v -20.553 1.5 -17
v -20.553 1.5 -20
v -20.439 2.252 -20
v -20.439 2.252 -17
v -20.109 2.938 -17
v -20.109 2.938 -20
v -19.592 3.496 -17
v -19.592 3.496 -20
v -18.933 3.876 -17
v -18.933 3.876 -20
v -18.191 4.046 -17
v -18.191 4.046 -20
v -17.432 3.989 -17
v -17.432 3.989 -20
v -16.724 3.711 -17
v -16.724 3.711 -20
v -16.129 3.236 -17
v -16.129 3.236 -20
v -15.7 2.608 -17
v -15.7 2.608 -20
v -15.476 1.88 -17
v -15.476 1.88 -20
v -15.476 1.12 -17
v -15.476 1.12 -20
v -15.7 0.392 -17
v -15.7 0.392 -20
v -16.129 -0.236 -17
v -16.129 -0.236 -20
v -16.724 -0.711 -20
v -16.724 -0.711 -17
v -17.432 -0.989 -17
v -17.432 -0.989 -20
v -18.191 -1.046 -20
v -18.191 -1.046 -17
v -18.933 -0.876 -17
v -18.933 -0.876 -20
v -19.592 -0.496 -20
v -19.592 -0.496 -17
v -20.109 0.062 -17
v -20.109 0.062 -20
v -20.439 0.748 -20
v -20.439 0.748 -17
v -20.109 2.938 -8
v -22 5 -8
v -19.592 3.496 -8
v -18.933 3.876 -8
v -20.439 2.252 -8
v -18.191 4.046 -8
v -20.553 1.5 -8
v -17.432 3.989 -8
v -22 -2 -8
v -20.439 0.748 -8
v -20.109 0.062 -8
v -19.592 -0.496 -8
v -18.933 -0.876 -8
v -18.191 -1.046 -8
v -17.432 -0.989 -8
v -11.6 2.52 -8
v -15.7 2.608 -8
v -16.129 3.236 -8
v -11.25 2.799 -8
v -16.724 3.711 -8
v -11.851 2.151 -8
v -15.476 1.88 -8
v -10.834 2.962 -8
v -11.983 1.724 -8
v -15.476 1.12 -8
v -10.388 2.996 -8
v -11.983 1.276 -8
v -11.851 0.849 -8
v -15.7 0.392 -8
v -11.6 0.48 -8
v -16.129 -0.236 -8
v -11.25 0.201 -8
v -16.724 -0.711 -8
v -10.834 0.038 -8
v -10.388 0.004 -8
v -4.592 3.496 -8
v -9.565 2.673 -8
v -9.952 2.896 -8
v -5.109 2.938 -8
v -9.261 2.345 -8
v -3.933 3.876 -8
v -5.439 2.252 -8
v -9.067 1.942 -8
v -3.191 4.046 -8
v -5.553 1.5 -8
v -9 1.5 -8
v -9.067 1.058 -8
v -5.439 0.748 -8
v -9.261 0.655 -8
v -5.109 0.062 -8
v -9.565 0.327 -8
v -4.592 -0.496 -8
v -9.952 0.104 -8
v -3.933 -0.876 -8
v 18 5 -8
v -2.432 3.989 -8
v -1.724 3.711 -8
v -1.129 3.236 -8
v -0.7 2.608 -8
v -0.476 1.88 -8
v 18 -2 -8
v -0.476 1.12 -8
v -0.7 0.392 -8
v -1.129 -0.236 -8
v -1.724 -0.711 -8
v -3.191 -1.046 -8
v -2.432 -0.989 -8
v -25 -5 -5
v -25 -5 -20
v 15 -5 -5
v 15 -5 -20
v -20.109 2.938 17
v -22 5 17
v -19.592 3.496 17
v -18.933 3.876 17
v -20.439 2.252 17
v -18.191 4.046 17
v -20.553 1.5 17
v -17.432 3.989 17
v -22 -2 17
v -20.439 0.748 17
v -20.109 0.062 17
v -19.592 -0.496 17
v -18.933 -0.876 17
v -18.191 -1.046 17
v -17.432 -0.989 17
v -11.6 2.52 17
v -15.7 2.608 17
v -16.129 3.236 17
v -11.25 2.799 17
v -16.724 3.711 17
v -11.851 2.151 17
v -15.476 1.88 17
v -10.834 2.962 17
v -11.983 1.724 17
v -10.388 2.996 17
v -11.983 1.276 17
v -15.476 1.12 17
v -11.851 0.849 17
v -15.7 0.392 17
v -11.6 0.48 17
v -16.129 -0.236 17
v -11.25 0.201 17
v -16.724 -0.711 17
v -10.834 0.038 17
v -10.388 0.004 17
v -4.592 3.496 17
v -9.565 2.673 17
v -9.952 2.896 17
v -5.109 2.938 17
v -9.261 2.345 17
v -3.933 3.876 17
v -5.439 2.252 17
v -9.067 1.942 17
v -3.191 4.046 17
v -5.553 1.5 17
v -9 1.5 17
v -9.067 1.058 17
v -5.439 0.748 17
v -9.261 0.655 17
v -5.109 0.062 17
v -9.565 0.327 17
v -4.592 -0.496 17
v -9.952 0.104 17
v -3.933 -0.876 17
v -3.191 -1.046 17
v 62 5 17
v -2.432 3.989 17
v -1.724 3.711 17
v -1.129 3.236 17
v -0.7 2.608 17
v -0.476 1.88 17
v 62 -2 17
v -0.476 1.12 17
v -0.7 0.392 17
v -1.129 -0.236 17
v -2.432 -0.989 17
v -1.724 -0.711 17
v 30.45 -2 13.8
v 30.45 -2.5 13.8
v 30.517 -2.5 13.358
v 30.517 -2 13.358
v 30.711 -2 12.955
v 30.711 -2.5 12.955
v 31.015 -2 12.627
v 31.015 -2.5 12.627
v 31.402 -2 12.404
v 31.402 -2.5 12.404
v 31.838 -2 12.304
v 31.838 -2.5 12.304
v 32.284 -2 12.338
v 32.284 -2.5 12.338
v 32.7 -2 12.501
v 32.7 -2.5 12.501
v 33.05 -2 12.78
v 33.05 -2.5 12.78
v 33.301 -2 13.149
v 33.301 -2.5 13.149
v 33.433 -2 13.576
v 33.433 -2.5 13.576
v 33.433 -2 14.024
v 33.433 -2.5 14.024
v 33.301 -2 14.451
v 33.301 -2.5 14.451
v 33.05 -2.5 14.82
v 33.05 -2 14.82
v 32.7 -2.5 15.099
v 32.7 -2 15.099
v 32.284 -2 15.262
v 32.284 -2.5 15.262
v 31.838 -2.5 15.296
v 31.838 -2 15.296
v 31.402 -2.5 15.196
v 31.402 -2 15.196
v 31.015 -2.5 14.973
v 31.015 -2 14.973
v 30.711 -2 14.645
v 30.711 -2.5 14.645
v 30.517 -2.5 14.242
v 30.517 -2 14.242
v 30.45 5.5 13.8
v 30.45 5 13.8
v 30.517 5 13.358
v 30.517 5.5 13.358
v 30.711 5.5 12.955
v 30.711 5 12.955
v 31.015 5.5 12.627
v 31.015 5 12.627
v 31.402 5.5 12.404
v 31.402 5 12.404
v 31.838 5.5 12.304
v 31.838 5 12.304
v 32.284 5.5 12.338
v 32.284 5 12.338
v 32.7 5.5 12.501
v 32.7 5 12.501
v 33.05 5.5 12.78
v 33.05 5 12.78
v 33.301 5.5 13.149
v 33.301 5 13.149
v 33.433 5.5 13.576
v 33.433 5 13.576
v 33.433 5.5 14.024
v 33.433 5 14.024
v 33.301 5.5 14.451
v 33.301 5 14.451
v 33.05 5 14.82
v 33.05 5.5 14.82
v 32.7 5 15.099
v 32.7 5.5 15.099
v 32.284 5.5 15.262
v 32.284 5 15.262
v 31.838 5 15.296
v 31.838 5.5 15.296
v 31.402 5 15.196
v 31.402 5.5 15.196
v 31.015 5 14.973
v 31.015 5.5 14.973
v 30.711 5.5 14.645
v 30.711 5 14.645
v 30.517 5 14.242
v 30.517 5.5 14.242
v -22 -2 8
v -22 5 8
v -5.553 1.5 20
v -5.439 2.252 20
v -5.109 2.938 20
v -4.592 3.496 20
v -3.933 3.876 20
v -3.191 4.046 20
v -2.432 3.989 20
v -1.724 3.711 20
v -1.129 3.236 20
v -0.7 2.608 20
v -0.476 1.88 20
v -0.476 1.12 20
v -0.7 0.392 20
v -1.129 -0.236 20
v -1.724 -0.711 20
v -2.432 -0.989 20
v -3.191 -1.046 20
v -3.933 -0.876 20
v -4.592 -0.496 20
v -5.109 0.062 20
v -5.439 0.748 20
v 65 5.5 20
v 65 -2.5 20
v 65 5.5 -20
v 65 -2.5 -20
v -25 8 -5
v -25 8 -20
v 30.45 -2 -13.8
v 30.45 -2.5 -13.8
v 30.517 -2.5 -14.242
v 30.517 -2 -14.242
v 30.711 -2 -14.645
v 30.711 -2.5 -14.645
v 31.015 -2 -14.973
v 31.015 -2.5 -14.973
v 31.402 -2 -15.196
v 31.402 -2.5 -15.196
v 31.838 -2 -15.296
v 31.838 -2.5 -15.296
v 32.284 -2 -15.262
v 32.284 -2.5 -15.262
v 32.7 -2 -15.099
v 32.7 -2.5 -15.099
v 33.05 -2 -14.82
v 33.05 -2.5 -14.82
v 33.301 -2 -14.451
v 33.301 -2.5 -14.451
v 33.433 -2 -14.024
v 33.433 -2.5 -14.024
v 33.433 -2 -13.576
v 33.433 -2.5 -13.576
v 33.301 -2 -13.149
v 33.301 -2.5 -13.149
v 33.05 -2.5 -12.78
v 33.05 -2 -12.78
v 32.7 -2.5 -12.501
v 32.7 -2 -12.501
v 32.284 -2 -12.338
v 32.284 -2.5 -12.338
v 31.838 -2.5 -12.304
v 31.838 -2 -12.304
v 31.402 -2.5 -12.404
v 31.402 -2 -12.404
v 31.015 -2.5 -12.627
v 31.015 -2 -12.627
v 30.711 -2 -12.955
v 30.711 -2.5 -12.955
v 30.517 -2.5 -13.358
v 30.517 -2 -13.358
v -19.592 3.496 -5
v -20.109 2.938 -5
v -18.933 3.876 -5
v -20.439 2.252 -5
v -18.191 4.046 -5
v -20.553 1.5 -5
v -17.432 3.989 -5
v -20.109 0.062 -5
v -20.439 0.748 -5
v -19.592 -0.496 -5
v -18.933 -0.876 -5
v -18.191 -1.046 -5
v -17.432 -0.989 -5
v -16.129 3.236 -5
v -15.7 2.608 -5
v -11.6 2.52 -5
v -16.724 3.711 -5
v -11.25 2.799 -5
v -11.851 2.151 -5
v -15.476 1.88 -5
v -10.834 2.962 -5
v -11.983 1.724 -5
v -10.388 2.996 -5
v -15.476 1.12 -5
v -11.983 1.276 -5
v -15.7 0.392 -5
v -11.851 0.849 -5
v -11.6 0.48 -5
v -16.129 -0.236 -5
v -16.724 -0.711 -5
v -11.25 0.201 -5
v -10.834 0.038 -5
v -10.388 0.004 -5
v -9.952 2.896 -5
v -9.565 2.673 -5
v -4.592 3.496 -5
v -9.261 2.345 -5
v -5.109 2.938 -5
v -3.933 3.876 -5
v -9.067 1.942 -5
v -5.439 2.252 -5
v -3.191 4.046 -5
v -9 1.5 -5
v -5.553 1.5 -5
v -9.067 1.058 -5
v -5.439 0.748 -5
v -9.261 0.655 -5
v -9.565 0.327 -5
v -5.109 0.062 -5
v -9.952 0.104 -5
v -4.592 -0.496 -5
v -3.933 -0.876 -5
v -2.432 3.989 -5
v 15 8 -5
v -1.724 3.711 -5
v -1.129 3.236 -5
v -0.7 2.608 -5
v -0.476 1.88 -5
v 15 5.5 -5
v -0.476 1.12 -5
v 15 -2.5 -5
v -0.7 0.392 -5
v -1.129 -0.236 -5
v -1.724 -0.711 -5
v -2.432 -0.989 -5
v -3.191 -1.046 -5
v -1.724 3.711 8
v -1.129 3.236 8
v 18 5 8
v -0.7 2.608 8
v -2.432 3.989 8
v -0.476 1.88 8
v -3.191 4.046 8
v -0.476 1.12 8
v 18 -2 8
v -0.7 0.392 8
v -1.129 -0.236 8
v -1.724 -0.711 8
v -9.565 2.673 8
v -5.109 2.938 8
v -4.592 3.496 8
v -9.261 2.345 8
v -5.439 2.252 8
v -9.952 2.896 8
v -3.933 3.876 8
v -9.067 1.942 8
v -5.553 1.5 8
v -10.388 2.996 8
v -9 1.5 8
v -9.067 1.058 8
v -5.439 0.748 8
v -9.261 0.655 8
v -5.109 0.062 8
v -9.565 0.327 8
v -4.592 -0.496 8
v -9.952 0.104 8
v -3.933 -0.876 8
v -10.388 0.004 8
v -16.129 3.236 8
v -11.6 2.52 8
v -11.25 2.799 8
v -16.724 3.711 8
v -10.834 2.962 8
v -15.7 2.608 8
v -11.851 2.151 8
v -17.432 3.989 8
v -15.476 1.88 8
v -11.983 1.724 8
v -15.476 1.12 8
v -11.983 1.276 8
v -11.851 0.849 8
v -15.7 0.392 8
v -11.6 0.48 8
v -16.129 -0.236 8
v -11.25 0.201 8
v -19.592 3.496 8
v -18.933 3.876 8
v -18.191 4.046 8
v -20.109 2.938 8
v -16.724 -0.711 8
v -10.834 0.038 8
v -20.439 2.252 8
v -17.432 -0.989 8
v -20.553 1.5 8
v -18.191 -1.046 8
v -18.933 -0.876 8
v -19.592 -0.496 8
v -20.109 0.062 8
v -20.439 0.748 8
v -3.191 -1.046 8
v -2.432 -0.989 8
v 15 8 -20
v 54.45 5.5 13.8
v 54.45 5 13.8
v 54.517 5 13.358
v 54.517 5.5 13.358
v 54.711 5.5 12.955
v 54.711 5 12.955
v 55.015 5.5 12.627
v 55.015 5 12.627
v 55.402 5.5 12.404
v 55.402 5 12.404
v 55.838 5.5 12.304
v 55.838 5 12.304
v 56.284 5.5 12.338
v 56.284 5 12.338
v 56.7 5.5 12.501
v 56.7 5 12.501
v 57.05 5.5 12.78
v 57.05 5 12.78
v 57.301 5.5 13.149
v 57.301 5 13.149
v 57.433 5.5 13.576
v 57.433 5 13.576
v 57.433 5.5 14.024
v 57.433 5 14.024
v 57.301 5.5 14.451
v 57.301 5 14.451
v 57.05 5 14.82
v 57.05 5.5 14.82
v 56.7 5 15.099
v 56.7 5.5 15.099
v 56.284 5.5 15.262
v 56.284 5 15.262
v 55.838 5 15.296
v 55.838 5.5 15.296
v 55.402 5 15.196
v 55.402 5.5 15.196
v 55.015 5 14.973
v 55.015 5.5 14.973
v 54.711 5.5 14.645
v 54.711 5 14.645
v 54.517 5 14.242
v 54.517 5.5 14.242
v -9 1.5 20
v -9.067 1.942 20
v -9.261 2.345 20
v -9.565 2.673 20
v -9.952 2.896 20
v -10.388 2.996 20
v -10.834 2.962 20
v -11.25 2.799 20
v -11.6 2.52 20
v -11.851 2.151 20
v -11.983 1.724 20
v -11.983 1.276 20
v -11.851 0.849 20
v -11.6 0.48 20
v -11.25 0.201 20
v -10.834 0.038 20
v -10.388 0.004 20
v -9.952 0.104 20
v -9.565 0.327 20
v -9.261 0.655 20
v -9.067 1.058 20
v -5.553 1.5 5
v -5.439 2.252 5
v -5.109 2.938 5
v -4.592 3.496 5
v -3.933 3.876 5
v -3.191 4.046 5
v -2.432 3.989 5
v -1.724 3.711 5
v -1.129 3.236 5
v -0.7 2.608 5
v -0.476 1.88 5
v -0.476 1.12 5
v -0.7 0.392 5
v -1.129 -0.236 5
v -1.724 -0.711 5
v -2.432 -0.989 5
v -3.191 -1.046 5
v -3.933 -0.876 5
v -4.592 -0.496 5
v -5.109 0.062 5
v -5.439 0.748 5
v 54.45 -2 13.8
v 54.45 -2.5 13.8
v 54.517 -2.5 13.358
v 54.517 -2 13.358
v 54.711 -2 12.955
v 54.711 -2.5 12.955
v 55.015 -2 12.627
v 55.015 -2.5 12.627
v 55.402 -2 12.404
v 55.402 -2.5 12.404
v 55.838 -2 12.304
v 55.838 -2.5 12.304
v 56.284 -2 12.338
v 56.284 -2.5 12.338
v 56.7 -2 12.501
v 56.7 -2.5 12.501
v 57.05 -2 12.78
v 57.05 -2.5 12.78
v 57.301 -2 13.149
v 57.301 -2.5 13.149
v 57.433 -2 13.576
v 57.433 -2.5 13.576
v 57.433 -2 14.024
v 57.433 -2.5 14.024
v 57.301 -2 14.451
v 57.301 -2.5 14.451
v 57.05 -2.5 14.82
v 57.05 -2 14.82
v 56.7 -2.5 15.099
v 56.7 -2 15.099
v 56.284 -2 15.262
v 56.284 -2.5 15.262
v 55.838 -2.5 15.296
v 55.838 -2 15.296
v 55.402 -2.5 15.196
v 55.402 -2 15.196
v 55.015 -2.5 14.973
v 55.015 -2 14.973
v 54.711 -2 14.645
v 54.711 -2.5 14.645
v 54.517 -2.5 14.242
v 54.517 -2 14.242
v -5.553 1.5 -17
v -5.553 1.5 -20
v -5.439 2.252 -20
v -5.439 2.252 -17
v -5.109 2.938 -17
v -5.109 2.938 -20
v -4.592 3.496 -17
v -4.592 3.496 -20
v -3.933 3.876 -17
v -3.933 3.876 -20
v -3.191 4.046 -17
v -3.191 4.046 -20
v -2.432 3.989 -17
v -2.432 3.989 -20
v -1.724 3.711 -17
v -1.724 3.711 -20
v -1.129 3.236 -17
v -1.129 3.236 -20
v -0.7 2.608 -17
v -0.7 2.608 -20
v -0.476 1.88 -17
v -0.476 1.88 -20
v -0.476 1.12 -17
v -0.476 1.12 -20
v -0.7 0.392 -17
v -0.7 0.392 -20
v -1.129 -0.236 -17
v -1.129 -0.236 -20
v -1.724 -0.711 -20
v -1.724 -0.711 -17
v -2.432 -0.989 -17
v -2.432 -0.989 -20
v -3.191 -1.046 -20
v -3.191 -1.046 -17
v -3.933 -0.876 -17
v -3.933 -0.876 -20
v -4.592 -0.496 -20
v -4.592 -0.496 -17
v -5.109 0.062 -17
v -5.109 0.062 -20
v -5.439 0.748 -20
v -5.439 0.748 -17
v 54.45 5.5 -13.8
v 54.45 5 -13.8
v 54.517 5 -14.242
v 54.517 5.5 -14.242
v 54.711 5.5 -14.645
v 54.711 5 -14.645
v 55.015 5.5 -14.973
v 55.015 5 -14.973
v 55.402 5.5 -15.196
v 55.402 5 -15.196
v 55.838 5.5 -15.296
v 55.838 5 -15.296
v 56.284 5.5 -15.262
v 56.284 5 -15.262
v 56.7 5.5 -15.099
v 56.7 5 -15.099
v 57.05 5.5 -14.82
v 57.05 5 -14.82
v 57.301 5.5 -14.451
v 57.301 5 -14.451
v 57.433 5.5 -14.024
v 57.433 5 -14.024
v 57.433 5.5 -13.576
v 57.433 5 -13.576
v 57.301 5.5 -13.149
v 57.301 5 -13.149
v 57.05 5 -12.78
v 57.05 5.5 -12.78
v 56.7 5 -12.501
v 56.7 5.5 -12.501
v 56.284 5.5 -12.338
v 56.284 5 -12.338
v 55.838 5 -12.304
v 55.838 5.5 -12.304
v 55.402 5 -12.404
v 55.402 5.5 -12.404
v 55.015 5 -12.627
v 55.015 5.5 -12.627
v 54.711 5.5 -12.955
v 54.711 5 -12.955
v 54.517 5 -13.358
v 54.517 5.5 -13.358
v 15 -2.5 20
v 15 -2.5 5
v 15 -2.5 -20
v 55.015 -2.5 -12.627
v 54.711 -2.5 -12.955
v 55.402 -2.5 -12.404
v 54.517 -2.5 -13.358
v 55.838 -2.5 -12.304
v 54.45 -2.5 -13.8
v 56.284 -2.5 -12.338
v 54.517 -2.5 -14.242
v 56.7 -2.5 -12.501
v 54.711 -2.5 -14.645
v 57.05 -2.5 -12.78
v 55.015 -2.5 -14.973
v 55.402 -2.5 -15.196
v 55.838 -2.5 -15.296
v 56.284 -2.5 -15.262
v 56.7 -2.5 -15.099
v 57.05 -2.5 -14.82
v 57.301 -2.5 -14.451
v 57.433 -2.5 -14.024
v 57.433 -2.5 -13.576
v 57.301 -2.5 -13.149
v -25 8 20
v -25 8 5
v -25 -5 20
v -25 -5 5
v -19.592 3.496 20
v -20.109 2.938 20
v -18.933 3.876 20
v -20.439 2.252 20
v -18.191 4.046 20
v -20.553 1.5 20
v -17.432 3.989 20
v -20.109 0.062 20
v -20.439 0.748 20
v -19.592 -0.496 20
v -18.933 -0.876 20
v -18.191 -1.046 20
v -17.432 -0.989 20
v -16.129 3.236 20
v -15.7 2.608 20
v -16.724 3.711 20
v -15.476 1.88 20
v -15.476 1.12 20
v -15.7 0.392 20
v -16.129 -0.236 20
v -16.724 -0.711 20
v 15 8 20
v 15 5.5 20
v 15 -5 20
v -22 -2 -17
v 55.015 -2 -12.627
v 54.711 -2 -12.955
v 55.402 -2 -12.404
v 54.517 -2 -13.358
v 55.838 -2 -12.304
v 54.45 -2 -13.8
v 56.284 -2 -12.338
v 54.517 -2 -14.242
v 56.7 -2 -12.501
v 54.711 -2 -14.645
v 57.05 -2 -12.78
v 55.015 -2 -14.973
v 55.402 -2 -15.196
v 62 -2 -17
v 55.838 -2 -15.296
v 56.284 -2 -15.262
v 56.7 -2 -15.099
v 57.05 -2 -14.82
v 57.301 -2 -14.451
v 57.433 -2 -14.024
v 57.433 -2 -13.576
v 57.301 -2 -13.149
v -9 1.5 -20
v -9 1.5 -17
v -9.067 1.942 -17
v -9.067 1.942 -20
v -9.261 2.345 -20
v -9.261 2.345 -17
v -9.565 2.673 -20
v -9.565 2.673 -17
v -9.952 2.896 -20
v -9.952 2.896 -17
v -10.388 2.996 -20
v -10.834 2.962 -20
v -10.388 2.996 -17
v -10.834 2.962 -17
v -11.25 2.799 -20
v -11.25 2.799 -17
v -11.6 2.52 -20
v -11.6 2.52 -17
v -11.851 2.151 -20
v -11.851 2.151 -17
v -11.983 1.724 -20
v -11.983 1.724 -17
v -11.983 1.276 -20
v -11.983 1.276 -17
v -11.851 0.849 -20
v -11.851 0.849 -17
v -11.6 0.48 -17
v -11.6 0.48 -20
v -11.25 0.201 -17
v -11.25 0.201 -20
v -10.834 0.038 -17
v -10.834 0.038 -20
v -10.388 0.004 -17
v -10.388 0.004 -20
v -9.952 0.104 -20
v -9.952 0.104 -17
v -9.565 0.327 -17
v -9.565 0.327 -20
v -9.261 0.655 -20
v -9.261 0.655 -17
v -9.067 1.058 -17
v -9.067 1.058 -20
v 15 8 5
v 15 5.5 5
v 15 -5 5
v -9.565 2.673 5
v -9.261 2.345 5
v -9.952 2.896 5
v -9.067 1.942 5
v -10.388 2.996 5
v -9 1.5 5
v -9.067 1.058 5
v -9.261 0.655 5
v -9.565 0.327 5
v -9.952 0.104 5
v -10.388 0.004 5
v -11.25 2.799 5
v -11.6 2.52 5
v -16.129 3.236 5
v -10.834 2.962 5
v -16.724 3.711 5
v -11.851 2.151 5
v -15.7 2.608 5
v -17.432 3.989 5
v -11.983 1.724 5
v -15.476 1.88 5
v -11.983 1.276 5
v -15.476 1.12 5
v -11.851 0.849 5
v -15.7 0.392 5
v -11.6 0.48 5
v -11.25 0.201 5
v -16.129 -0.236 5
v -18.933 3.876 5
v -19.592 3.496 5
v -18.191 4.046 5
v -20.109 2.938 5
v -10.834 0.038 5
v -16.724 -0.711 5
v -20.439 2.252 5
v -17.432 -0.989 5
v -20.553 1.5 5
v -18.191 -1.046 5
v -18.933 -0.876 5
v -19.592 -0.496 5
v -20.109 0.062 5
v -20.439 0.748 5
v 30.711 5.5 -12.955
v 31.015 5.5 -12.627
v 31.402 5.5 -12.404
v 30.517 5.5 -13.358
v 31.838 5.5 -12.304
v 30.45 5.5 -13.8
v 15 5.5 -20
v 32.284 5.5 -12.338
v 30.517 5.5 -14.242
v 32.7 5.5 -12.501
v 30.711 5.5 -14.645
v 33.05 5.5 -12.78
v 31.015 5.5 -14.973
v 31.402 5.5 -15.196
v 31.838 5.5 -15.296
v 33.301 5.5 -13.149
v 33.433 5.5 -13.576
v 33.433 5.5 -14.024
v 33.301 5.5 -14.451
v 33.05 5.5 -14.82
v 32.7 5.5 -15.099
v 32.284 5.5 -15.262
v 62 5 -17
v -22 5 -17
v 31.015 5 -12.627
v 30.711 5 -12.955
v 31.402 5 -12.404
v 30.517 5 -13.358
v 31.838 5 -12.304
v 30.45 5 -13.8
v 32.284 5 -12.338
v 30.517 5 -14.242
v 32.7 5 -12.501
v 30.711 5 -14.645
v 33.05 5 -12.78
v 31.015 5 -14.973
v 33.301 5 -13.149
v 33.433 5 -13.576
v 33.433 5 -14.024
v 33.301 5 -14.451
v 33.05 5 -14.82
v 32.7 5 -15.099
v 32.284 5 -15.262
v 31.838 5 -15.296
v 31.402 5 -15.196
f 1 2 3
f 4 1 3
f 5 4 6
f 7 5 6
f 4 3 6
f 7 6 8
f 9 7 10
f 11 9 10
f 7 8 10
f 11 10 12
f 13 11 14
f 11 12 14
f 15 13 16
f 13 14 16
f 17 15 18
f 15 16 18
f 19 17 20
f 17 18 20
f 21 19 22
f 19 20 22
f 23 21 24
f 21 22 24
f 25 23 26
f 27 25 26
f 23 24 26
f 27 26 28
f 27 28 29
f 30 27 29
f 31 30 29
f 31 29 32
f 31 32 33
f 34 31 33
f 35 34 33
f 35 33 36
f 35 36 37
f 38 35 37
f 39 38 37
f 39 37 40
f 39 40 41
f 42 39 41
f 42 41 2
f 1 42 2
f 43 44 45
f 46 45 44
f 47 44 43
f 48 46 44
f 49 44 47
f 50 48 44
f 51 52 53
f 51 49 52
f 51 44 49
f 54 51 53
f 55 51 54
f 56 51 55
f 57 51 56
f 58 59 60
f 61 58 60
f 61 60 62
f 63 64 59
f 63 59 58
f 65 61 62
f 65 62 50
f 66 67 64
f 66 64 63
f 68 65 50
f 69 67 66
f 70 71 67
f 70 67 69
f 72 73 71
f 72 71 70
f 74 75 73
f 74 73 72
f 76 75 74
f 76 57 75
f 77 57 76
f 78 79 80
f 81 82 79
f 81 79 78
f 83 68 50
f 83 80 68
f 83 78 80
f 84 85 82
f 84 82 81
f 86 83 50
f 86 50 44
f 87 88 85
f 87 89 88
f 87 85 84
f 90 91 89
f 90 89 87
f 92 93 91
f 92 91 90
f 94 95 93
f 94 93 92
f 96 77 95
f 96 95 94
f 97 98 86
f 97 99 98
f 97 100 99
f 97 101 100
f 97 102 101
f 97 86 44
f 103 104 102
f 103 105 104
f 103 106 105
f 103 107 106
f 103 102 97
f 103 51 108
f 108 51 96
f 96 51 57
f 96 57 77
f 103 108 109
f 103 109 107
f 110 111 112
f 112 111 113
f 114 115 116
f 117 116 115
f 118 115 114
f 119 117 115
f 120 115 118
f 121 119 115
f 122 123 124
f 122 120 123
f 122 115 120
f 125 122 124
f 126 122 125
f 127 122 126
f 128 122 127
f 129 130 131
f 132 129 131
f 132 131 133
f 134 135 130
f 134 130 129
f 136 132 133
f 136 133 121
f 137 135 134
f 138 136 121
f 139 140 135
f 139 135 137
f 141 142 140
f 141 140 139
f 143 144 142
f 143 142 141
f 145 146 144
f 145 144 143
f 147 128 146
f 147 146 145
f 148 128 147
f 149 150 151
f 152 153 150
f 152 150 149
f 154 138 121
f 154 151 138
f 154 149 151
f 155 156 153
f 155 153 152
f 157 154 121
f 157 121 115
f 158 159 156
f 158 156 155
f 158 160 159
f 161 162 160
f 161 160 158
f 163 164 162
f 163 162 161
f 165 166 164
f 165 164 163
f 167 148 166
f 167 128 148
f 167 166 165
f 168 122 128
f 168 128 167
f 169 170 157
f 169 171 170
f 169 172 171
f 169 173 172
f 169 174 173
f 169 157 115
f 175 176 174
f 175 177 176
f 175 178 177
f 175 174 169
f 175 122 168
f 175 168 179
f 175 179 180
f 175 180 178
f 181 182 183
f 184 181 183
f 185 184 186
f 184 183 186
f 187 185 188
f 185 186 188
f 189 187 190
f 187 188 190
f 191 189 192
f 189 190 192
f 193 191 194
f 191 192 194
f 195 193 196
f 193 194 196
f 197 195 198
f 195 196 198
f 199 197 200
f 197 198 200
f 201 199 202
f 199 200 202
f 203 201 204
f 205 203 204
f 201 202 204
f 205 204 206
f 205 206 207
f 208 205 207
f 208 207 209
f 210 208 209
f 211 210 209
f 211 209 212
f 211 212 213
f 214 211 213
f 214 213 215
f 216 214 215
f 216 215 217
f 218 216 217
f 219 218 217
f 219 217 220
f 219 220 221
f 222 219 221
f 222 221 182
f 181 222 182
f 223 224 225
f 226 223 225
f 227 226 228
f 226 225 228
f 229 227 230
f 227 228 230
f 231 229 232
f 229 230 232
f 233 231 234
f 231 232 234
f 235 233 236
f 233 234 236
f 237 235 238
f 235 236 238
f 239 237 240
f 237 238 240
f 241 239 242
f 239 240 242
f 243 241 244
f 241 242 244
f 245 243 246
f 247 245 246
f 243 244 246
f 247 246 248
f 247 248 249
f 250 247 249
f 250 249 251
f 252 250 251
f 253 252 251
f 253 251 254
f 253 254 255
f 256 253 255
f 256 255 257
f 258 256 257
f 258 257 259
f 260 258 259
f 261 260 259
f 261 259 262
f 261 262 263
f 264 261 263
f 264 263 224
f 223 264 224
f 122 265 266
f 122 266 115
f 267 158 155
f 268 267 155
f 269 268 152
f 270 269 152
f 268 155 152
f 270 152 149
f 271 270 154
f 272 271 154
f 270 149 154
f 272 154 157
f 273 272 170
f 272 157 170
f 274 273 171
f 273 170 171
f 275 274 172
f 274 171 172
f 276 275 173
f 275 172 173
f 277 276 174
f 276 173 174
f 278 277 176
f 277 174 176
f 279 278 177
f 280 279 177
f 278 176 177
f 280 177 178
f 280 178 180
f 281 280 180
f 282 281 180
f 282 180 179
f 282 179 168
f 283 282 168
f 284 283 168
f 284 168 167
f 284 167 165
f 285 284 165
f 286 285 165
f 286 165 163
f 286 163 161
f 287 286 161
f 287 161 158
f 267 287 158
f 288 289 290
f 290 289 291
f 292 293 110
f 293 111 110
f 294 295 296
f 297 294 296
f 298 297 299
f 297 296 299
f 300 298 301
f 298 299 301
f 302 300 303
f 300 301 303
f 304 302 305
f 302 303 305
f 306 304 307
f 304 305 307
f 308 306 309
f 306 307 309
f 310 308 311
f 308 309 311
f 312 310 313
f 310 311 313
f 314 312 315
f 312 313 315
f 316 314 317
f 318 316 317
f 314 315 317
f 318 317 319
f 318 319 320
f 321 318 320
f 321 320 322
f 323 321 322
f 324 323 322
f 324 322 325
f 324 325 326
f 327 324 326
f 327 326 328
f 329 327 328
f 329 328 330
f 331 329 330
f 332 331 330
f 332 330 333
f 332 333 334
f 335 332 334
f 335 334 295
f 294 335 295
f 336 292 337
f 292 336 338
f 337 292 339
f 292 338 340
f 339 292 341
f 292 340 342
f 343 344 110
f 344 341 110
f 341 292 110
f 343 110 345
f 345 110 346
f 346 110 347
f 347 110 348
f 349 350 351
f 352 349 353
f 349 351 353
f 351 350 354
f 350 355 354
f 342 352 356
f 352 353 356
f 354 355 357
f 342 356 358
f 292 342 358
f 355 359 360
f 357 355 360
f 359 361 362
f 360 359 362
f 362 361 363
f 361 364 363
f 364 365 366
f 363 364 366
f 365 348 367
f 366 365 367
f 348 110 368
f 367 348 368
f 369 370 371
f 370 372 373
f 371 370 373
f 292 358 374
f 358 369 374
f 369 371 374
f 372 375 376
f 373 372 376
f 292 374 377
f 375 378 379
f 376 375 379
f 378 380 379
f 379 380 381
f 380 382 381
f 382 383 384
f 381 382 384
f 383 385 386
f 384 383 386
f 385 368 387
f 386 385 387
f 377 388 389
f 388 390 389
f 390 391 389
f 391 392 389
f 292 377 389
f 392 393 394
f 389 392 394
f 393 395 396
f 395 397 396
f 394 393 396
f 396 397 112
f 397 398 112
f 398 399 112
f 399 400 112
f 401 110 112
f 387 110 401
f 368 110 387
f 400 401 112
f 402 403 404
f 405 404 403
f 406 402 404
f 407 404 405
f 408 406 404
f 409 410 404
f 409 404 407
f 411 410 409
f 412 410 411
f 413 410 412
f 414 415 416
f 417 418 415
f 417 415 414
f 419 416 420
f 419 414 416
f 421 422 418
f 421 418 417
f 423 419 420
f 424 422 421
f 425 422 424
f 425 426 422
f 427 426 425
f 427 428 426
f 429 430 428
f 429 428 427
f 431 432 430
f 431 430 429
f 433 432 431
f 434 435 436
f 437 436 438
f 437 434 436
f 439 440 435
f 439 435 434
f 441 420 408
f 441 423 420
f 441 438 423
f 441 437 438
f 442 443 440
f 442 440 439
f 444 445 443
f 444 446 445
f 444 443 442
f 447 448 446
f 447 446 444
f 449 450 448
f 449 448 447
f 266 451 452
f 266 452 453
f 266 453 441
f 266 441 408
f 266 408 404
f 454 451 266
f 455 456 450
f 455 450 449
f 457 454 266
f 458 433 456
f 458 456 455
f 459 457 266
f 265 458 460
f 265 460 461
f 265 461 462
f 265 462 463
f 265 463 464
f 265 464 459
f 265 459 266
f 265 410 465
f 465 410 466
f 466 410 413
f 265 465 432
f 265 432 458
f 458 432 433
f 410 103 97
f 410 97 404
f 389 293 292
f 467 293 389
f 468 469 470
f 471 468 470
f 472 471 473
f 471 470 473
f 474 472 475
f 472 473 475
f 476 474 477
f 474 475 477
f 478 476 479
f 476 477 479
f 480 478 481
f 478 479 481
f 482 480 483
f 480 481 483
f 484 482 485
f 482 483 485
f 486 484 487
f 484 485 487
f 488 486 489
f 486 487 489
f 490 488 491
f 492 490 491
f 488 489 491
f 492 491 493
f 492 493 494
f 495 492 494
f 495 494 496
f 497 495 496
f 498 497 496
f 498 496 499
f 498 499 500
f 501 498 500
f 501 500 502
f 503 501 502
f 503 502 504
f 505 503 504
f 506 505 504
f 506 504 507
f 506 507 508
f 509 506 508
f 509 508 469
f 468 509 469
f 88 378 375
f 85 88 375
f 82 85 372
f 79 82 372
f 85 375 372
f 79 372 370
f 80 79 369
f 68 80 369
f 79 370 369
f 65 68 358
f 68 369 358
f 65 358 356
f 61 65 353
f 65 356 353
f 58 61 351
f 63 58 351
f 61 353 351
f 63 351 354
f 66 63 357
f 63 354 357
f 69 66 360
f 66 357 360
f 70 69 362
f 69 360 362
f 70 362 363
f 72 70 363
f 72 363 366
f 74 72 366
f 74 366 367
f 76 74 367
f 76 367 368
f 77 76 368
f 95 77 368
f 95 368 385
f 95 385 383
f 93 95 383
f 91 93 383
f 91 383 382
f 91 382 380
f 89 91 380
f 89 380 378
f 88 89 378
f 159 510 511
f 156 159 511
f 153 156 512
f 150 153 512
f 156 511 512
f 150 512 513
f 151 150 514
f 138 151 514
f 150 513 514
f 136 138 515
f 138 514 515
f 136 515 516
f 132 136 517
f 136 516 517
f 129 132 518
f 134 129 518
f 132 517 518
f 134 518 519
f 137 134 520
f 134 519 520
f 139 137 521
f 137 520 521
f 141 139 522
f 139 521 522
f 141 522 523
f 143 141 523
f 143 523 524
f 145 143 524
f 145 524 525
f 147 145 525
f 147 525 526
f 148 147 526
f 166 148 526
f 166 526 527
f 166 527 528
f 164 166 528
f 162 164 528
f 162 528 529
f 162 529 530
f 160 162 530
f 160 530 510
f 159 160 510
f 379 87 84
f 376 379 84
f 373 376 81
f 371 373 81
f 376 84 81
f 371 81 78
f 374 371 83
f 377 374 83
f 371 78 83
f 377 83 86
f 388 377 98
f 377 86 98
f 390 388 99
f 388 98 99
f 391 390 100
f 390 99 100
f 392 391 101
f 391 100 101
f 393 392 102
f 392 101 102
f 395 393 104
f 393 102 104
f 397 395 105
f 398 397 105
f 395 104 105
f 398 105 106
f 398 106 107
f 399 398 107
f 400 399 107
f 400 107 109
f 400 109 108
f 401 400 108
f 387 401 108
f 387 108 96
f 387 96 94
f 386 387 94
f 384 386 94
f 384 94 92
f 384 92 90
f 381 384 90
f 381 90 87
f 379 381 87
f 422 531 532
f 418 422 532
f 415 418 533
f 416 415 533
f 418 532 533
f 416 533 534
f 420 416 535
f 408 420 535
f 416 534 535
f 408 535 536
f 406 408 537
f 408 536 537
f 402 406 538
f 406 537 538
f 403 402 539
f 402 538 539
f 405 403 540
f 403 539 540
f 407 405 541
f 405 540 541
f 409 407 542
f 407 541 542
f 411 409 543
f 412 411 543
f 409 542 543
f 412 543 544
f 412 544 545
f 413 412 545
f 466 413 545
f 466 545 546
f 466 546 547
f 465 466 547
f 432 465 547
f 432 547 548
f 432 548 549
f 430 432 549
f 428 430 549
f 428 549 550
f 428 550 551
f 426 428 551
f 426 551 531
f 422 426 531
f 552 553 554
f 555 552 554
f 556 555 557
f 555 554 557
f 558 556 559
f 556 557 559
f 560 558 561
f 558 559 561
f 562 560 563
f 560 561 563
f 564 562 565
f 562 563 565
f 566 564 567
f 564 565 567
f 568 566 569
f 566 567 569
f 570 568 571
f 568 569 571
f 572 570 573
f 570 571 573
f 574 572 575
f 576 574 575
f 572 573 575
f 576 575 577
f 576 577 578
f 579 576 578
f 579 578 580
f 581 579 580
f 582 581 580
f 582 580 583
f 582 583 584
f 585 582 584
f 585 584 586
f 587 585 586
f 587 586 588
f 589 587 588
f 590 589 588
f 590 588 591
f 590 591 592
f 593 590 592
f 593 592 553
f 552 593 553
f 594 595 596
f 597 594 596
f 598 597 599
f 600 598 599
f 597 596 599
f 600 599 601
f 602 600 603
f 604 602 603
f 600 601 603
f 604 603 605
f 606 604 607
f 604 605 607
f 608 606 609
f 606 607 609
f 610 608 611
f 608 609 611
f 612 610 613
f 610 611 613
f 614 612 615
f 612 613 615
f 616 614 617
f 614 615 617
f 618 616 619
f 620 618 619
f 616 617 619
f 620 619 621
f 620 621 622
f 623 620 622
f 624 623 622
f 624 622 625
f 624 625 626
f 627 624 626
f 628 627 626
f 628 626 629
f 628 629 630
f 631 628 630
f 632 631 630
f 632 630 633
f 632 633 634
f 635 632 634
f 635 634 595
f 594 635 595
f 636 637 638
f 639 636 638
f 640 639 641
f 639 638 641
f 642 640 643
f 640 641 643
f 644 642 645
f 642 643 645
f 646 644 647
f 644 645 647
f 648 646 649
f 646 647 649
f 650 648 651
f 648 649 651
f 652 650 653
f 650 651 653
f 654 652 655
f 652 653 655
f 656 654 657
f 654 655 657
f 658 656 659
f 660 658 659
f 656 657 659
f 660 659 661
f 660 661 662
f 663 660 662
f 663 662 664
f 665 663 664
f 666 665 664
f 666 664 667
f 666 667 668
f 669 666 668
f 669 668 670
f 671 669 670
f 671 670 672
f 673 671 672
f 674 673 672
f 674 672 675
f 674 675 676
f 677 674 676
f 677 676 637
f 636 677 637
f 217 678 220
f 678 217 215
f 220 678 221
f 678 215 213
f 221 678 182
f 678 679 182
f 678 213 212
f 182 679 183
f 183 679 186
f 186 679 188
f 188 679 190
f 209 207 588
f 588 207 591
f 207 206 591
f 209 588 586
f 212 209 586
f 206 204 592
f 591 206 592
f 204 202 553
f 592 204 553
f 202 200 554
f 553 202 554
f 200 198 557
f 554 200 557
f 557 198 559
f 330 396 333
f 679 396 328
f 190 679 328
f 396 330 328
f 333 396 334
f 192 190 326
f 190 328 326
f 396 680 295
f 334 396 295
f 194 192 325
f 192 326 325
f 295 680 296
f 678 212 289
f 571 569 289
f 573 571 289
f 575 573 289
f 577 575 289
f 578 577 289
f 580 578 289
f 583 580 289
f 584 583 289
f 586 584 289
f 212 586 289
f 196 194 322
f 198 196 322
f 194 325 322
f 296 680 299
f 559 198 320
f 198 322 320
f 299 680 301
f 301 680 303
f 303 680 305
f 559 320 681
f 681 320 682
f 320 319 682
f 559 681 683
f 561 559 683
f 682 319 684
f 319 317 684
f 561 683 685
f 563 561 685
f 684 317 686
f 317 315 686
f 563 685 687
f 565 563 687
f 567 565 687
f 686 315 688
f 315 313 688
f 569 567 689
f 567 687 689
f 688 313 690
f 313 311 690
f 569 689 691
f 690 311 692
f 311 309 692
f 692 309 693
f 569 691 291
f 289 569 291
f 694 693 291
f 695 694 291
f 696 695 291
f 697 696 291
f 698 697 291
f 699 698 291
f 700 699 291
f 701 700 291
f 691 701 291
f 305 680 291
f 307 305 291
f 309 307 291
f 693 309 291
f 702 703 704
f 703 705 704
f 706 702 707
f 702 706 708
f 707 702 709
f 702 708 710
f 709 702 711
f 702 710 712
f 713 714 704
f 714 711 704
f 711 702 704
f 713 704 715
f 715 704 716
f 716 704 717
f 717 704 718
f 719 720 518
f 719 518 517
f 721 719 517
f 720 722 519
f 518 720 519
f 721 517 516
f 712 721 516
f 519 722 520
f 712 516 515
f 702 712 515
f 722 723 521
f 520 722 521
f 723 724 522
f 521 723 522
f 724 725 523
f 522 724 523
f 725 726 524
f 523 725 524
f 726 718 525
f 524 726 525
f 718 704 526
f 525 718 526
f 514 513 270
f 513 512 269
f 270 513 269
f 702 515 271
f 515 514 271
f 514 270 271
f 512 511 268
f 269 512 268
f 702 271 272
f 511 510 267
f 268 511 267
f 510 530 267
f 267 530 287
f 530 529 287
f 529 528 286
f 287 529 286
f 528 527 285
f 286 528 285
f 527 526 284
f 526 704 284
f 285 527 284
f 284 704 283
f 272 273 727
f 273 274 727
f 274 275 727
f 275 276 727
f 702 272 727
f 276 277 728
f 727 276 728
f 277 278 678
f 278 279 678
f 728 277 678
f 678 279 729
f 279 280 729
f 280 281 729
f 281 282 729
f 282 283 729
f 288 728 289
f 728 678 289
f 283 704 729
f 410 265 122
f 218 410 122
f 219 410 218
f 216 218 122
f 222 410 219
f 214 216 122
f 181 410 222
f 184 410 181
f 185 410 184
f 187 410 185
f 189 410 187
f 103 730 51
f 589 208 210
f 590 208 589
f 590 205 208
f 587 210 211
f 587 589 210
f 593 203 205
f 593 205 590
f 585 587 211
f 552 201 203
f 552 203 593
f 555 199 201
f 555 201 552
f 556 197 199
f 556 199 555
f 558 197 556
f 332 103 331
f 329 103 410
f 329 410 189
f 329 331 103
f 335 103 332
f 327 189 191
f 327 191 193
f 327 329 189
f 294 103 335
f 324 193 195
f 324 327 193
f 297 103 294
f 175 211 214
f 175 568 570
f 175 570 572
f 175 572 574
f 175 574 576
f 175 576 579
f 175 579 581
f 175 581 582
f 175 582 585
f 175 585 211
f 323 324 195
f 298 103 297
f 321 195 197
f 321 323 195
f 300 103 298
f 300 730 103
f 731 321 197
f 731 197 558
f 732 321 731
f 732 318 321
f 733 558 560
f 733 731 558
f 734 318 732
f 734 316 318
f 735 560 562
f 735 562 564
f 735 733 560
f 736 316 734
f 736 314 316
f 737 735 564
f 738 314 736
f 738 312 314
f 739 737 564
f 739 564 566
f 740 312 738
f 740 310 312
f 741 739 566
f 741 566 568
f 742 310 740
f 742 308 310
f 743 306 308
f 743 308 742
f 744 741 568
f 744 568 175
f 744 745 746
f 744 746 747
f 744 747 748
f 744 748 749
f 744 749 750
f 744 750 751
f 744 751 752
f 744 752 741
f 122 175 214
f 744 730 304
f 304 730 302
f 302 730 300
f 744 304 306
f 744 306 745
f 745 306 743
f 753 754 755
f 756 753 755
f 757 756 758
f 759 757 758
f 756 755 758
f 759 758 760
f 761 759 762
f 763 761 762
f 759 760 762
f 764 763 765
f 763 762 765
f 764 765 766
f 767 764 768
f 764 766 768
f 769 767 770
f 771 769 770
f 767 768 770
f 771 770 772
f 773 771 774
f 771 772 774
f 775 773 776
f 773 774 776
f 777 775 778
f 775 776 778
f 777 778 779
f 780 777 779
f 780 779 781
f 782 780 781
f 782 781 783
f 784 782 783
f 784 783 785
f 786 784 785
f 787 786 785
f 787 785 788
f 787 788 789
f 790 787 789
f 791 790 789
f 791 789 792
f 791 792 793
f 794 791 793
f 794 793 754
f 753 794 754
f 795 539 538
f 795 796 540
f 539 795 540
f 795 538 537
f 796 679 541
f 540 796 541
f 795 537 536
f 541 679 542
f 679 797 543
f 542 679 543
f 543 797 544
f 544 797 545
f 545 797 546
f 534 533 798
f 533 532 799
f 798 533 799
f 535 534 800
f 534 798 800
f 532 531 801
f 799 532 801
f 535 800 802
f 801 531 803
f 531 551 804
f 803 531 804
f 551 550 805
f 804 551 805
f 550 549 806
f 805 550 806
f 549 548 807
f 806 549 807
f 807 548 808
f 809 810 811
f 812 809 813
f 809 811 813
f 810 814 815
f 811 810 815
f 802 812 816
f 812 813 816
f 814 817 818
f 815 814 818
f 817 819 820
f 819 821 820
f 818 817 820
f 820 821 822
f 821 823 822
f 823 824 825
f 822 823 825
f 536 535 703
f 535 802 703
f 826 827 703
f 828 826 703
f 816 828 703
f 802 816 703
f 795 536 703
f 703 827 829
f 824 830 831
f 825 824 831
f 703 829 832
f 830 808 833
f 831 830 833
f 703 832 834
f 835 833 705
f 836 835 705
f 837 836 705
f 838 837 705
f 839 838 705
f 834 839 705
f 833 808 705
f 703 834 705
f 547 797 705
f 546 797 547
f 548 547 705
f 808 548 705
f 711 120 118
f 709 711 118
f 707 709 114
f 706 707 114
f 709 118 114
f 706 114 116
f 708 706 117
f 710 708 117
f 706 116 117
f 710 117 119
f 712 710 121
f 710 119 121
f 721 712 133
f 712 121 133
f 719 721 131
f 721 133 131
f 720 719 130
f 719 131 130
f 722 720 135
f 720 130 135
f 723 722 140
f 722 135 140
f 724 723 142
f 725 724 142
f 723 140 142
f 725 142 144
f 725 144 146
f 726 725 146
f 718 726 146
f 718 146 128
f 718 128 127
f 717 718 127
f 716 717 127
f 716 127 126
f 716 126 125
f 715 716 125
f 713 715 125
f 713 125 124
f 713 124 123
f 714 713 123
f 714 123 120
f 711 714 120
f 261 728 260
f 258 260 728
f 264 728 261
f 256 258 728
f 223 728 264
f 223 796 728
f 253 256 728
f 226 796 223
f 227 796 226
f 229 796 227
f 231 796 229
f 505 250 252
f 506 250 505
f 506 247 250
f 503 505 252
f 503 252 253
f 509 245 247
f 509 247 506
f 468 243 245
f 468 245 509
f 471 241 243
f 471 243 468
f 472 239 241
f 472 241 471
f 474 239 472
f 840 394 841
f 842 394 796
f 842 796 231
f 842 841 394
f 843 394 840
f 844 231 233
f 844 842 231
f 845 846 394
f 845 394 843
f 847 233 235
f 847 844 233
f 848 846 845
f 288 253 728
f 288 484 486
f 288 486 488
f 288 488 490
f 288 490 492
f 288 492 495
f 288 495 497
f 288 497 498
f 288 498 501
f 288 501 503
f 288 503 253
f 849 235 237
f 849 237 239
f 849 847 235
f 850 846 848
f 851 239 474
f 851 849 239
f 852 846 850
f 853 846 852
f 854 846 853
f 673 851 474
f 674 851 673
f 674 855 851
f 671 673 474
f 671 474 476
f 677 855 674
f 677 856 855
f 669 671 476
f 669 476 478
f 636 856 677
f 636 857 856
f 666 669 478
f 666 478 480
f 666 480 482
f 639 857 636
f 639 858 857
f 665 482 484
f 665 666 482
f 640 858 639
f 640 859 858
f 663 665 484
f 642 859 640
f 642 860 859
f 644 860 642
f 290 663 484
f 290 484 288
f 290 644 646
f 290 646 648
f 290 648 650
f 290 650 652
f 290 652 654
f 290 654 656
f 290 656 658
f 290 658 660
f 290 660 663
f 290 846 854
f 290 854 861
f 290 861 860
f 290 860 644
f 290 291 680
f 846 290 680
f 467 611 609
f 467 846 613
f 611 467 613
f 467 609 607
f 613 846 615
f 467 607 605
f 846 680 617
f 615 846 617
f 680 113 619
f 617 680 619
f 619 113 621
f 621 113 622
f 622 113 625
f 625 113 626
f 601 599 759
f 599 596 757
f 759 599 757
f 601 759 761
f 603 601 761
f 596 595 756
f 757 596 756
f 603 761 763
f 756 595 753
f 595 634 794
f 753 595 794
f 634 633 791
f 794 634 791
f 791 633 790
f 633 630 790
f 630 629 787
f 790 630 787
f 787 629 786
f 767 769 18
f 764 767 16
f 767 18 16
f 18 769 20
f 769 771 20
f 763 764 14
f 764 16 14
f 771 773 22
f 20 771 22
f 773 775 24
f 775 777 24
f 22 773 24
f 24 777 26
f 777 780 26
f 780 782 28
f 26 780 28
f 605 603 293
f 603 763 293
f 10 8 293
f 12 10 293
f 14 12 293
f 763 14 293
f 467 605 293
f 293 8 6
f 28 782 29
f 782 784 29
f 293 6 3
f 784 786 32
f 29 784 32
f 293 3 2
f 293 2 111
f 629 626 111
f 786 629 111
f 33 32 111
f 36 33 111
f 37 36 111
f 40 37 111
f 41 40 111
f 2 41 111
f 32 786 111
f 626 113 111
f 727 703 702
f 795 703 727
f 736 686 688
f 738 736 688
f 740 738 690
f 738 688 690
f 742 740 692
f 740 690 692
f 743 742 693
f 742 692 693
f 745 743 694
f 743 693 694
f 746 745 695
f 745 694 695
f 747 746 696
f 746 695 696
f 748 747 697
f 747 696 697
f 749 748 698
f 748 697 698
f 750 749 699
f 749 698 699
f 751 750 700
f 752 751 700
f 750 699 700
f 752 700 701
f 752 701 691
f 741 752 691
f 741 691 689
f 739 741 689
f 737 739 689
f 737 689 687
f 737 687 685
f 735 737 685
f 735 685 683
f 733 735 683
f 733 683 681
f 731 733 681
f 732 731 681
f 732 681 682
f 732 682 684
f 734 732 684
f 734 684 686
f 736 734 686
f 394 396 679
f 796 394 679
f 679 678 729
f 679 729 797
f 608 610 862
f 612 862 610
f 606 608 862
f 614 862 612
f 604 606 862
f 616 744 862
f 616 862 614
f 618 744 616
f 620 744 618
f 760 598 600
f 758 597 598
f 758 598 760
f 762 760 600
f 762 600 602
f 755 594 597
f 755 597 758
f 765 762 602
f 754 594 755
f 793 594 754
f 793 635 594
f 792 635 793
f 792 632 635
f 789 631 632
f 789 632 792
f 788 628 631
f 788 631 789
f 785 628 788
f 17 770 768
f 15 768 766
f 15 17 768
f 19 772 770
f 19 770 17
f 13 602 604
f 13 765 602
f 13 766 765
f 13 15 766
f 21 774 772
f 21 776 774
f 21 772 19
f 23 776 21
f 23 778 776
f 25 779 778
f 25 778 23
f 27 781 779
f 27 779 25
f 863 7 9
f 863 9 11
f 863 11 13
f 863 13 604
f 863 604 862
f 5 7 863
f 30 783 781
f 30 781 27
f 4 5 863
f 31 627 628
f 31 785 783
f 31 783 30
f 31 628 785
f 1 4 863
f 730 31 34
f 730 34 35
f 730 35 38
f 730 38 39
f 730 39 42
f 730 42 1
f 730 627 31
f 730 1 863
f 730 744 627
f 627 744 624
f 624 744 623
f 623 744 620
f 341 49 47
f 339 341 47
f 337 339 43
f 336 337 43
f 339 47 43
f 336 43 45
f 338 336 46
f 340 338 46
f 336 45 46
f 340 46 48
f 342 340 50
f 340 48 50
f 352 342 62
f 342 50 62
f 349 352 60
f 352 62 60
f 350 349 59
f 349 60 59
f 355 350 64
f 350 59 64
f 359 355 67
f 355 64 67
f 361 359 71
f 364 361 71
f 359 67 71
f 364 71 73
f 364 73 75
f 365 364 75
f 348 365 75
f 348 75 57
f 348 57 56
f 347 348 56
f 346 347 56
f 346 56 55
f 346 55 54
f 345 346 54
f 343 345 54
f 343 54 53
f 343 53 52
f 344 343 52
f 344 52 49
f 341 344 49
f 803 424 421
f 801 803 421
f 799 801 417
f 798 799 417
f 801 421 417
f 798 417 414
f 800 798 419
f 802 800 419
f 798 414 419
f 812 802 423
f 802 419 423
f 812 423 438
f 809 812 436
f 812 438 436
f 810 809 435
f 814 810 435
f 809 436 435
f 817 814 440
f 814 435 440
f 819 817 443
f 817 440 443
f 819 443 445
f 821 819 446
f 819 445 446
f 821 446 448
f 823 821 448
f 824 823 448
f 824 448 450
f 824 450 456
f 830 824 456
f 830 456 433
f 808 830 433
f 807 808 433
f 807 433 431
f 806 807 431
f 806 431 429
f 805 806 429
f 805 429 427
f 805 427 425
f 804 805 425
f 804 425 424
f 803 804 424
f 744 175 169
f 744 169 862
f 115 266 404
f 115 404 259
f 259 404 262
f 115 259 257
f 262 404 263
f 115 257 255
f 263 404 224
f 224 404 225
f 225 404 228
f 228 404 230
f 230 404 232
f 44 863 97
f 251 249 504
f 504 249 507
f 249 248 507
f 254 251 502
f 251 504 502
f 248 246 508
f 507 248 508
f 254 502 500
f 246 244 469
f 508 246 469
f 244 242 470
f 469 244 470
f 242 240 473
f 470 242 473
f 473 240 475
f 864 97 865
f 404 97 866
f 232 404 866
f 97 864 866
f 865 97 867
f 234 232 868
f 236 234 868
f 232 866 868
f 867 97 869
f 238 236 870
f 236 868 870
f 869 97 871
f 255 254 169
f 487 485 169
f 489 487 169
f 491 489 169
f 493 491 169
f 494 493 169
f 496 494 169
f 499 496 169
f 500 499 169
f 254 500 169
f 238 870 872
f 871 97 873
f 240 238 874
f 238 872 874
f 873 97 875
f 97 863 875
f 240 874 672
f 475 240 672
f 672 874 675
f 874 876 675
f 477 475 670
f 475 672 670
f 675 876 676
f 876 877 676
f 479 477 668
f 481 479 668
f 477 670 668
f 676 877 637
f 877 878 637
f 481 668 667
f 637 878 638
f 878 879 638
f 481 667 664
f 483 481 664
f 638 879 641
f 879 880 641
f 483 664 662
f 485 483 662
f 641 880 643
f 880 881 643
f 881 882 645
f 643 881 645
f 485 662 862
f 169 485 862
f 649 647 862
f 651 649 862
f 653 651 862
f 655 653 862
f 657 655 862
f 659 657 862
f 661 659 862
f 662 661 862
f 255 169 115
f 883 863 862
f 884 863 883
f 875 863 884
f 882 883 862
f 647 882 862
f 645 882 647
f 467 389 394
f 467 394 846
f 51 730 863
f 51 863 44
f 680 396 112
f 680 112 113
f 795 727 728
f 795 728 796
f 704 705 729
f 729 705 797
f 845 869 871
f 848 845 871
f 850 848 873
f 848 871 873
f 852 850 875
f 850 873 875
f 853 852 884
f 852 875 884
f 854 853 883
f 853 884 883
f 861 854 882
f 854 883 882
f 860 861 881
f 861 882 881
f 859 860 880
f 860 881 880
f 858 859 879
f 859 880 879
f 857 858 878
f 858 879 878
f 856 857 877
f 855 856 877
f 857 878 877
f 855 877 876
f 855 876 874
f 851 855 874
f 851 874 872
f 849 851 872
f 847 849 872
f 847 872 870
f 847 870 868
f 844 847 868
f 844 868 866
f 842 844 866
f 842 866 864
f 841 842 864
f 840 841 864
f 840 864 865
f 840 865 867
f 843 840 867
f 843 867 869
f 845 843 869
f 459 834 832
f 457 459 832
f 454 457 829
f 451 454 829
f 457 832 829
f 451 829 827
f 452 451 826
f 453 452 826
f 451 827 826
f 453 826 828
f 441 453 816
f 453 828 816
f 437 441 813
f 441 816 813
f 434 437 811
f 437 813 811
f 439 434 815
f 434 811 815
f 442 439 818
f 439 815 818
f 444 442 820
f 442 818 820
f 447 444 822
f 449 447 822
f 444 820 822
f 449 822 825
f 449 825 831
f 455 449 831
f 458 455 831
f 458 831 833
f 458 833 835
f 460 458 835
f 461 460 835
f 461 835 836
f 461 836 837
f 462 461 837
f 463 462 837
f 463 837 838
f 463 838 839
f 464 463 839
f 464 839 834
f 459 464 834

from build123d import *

# Parameters (mm, degrees)
BOSS_EXTRUDE1_DEPTH             = 5
BOSS_EXTRUDE1_DEPTH_BACK        = 5
SHELL1_T                        = -3
BOSS_EXTRUDE2_START             = 5
BOSS_EXTRUDE2_DEPTH             = 3
SKETCH2_R                       = 1.5
CUT_EXTRUDE1_DEPTH              = 100
SKETCH9_W                       = 40
SKETCH9_H                       = 2.5
CUT_EXTRUDE2_DEPTH              = 77.739820172
SKETCH10_W                      = 10
SKETCH10_H                      = 40
CUT_EXTRUDE3_DEPTH              = 2.5
CUT_EXTRUDE4_START              = -10.5
SKETCH10_2_W                    = 10
SKETCH10_2_H                    = 40
CUT_EXTRUDE4_DEPTH              = 2.5
F_3_0MM_CLEARANCE_DOWEL_HOLE1_D = 3
F_1_4_20_TAPPED_HOLE1_D         = 5.1054


with BuildPart() as part:
    # Sketch1 → Boss-Extrude1 (new, two sides: drawn at the far end of the back side and taken through both)
    with BuildSketch(Plane(origin=(0, 0, 0), x_dir=(1, 0, 0), z_dir=(0, 1, 0)).offset(-BOSS_EXTRUDE1_DEPTH_BACK)):
        Polygon((15, -5), (-25, -5), (-25, -20), (25, -20), (65, -20), (65, 20), (25, 20), (-25, 20), (-25, 5), (15, 5), align=None)
    extrude(amount=BOSS_EXTRUDE1_DEPTH + BOSS_EXTRUDE1_DEPTH_BACK)

    # Shell1
    shell1_openings = [part.faces().sort_by_distance(p)[0] for p in [
        (23.125, 5, 0),
    ]]
    offset(amount=SHELL1_T, openings=shell1_openings, kind=Kind.INTERSECTION)

    # Sketch1<2> → Boss-Extrude2 (add)
    with BuildSketch(Plane(origin=(0, 0, 0), x_dir=(1, 0, 0), z_dir=(0, 1, 0)).offset(BOSS_EXTRUDE2_START)):
        Polygon((15, -5), (-25, -5), (-25, -20), (25, -20), (65, -20), (65, 20), (25, 20), (-25, 20), (-25, 5), (15, 5), align=None)
    extrude(amount=BOSS_EXTRUDE2_DEPTH)

    # Sketch2 → Cut-Extrude1 (cut)
    with BuildSketch(Plane.XY.offset(20)):
        with Locations((-10.5, 1.5)):
            Circle(SKETCH2_R)
    extrude(amount=-CUT_EXTRUDE1_DEPTH, mode=Mode.SUBTRACT)

    # Sketch9 → Cut-Extrude2 (cut, through all)
    with BuildSketch(Plane.XY.offset(20)):
        with Locations((45, 6.75)):
            Rectangle(SKETCH9_W, SKETCH9_H)
        with Locations((45, -3.75)):
            Rectangle(SKETCH9_W, SKETCH9_H)
    extrude(amount=-CUT_EXTRUDE2_DEPTH, mode=Mode.SUBTRACT)

    # Sketch10 → Cut-Extrude3 (cut)
    with BuildSketch(Plane(origin=(0, 8, 0), x_dir=(1, 0, 0), z_dir=(0, 1, 0))):
        with Locations((20, 0)):
            Rectangle(SKETCH10_W, SKETCH10_H)
    extrude(amount=-CUT_EXTRUDE3_DEPTH, mode=Mode.SUBTRACT)

    # Sketch10<2> → Cut-Extrude4 (cut)
    with BuildSketch(Plane(origin=(0, 8, 0), x_dir=(1, 0, 0), z_dir=(0, 1, 0)).offset(CUT_EXTRUDE4_START)):
        with Locations((20, 0)):
            Rectangle(SKETCH10_2_W, SKETCH10_2_H)
    extrude(amount=-CUT_EXTRUDE4_DEPTH, mode=Mode.SUBTRACT)

    # Ø3.0mm Clearance Dowel Hole1 (through all)
    with Locations(Plane(origin=(0, 5.5, 0), x_dir=(1, 0, 0), z_dir=(0, 1, 0))):
        with Locations((31.950000364, 13.8), (31.950000364, -13.8), (55.950000364, -13.8), (55.950000364, 13.8)):
            Hole(F_3_0MM_CLEARANCE_DOWEL_HOLE1_D / 2)

    # 1/4-20 Tapped Hole1 (through all)
    with Locations(Plane.XY.offset(20)):
        with Locations((-18, 1.5), (-3, 1.5)):
            Hole(F_1_4_20_TAPPED_HOLE1_D / 2)


solid = part.part
